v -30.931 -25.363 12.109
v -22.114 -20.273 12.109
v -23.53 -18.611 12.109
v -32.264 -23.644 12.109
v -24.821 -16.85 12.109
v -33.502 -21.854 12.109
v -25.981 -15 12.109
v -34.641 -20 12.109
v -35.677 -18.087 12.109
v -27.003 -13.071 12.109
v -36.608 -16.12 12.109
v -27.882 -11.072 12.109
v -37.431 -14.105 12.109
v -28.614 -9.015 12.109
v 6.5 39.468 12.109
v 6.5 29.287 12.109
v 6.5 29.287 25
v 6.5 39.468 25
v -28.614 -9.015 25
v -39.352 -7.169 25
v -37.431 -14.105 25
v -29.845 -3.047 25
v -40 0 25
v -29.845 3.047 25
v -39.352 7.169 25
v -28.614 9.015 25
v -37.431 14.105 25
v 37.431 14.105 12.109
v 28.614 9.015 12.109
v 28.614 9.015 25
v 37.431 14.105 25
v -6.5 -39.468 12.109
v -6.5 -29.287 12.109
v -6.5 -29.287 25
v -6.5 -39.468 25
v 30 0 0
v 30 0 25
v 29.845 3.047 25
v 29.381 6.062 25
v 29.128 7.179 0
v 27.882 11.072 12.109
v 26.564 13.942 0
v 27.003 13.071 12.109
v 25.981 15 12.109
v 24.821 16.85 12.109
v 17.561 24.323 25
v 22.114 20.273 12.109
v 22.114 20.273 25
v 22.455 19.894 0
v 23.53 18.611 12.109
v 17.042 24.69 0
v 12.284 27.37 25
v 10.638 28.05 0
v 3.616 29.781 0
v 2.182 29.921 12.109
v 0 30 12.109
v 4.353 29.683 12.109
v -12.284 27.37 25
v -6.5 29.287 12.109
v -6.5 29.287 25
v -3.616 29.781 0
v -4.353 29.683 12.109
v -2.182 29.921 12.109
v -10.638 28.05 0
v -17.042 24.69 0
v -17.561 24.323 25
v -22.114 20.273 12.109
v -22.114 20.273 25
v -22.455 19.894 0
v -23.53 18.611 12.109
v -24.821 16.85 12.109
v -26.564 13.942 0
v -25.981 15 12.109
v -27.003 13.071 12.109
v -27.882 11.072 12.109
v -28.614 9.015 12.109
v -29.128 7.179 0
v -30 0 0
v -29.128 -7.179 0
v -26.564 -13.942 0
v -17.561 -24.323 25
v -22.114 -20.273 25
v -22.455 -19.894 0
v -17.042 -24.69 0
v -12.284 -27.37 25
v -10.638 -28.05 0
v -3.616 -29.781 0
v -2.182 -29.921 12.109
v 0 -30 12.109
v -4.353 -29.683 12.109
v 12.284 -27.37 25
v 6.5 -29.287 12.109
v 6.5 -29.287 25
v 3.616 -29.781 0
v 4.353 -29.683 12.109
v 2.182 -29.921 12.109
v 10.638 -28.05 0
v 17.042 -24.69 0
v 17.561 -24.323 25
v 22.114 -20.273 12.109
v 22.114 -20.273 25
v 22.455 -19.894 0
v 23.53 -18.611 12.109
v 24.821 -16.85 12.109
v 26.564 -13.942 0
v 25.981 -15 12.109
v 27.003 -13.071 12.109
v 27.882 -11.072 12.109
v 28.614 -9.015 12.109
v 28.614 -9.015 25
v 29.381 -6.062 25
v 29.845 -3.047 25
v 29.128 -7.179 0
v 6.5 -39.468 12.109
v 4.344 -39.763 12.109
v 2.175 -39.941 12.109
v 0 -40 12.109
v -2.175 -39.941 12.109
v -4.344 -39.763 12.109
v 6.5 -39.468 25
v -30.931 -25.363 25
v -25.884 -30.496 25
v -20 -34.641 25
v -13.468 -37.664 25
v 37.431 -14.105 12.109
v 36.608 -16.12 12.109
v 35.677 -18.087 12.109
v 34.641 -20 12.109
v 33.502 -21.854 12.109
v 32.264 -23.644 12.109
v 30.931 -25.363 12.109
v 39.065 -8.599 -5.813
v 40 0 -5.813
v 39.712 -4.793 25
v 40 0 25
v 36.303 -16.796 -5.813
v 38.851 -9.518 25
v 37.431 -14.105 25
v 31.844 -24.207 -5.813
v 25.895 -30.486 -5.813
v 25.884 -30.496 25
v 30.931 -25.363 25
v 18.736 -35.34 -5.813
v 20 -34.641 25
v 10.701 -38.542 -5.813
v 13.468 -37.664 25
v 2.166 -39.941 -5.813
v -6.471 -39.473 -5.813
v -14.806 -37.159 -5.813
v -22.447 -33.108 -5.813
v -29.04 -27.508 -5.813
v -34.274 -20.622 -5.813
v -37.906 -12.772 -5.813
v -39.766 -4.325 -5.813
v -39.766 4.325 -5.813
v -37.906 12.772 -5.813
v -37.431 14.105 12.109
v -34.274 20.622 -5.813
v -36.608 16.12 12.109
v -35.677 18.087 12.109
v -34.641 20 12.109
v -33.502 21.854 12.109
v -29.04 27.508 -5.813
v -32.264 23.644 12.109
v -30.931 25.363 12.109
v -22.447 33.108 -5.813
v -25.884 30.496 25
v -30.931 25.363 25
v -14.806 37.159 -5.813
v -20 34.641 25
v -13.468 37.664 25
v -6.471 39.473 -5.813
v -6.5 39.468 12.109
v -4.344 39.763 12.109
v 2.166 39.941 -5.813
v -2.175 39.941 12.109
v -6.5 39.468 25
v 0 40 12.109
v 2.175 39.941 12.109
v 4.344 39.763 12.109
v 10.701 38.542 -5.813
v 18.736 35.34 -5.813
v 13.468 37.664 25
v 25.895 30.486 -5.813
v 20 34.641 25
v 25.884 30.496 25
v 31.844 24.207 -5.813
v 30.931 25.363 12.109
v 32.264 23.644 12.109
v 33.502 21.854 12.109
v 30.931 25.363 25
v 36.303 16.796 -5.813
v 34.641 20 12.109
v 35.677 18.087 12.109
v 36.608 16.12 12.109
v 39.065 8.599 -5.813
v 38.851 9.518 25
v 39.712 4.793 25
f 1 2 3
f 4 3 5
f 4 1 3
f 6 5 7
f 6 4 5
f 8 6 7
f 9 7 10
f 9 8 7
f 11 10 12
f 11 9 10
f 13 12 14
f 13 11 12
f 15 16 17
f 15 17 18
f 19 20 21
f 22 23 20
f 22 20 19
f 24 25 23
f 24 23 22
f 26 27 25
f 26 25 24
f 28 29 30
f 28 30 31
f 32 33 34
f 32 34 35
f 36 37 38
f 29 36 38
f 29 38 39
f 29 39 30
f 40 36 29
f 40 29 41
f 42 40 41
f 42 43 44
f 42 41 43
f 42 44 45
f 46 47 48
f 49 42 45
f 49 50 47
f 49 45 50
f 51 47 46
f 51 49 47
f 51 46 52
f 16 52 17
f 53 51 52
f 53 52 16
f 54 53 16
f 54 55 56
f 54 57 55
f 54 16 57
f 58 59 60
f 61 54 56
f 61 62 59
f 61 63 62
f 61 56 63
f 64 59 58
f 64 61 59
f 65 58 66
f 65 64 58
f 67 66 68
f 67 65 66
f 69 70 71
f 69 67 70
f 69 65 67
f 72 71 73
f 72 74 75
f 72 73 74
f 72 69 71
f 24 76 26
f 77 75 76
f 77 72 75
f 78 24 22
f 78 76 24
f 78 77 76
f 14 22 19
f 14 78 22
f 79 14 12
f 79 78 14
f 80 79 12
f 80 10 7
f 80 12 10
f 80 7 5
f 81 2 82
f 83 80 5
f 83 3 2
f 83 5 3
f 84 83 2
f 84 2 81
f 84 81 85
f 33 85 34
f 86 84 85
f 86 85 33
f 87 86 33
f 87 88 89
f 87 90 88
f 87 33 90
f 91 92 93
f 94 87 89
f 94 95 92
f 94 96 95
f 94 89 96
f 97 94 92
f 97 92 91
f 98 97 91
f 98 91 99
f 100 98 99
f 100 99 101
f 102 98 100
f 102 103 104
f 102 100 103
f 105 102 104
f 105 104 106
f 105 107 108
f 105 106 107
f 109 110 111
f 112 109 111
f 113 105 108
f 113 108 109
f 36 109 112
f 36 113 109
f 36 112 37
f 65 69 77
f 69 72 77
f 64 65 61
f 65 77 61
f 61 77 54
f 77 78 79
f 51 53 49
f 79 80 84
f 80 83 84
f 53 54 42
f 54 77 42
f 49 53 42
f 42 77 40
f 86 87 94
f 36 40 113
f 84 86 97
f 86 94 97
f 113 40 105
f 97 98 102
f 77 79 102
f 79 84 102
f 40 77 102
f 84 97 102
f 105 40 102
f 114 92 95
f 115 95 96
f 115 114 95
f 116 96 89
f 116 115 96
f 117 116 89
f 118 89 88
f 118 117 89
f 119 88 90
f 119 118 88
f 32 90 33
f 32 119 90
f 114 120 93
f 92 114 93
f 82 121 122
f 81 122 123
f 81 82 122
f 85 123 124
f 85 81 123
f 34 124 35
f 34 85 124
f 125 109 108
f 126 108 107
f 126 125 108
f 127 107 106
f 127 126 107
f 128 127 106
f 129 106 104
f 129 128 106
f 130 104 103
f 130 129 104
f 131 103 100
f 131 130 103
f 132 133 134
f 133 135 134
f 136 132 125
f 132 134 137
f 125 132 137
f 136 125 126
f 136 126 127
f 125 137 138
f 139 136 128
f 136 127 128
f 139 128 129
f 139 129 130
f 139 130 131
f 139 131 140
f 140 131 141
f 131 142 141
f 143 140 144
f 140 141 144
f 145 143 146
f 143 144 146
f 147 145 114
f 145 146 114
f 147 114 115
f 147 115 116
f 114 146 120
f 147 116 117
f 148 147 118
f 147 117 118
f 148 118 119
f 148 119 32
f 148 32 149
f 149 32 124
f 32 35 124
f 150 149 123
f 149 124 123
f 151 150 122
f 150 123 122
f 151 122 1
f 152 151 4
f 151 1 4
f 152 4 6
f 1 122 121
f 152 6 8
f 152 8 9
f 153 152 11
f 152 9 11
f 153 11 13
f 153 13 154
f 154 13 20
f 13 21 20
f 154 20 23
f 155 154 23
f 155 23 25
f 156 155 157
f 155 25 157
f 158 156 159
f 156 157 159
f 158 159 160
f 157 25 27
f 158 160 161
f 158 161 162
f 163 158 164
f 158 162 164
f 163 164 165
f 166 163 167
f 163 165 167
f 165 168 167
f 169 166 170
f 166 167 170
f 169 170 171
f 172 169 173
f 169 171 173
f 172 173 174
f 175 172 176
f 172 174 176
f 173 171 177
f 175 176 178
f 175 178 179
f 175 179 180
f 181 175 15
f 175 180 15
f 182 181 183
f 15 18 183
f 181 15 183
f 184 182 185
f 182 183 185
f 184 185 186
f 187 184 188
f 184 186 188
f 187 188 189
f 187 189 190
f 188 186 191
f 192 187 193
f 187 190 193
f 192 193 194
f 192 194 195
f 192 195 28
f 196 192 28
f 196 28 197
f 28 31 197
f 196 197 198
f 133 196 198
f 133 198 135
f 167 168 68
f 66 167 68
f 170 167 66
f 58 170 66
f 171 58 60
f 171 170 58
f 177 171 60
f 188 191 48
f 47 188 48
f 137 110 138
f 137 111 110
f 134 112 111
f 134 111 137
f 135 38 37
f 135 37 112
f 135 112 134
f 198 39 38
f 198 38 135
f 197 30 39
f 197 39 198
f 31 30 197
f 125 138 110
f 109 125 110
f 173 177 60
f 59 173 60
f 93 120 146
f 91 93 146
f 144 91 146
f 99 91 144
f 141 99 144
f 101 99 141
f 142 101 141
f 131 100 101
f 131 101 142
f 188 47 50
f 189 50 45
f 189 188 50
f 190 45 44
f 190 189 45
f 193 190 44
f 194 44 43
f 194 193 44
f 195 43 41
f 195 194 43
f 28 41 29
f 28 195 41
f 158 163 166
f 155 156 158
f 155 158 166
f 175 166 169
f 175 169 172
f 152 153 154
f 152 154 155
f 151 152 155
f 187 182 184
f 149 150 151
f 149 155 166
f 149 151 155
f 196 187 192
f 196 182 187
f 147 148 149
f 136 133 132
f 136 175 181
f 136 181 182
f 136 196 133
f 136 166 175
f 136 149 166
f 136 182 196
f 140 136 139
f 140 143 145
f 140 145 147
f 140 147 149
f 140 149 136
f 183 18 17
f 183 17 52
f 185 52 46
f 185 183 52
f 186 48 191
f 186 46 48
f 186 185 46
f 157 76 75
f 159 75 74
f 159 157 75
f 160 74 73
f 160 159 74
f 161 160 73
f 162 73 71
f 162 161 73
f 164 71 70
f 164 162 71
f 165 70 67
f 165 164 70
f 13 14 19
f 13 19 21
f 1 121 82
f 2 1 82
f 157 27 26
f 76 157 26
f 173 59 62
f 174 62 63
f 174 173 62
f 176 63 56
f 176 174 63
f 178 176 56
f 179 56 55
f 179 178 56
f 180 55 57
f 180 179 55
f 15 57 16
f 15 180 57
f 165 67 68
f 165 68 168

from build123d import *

# Parameters (mm, degrees)
F0_R            = 40
F0_R_2          = 30
F1_DEPTH        = 25
F3_DEPTH        = 12.8905829042
F3_COPIES_COUNT = 6
F5_R            = 40
F5_R_2          = 30
F6_DEPTH        = 5.8128256351


# Not quite as in the source:
# - a pattern or mirror of a feature is missing from the dataset's text; its kind, count and spacing are read off the source's solid


with BuildPart() as f1:
    # F0 (on Top) → F1 (new body)
    with BuildSketch(Plane.XY):
        Circle(F0_R)
        Circle(F0_R_2, mode=Mode.SUBTRACT)
    extrude(amount=F1_DEPTH)

    # F2 (on face) → F3 (cut)
    with BuildSketch(Plane.XY.offset(25)):
        with BuildLine():
            Line((6.5, 29.2873692912), (6.5, 39.4683417437))
            ThreePointArc((6.5, 39.4683417437), (3.2608534351, 39.8668638706), (0, 40))
            ThreePointArc((0, 40), (-3.2608534351, 39.8668638706), (-6.5, 39.4683417437))
            Line((-6.5, 39.4683417437), (-6.5, 29.2873692912))
            ThreePointArc((-6.5, 29.2873692912), (-3.2694740604, 29.8213101551), (0, 30))
            ThreePointArc((0, 30), (3.2694740604, 29.8213101551), (6.5, 29.2873692912))
        make_face()
    f3 = extrude(amount=-F3_DEPTH, mode=Mode.SUBTRACT)

    # F3_copies: F3 ×6 about axis
    f3_copies_axis = Axis((0, 0, 0), (0, 0, 1))
    for i in range(1, F3_COPIES_COUNT):
        add(f3.rotate(f3_copies_axis, i * 360 / F3_COPIES_COUNT), mode=Mode.SUBTRACT)

    # F5 (on face) → F6 (join)
    with BuildSketch(Plane(origin=(0, 0, 0), x_dir=(1, 0, 0), z_dir=(0, 0, -1))):
        Circle(F5_R)
        Circle(F5_R_2, mode=Mode.SUBTRACT)
        Circle(F5_R)
    extrude(amount=F6_DEPTH)


solid = f1.part
